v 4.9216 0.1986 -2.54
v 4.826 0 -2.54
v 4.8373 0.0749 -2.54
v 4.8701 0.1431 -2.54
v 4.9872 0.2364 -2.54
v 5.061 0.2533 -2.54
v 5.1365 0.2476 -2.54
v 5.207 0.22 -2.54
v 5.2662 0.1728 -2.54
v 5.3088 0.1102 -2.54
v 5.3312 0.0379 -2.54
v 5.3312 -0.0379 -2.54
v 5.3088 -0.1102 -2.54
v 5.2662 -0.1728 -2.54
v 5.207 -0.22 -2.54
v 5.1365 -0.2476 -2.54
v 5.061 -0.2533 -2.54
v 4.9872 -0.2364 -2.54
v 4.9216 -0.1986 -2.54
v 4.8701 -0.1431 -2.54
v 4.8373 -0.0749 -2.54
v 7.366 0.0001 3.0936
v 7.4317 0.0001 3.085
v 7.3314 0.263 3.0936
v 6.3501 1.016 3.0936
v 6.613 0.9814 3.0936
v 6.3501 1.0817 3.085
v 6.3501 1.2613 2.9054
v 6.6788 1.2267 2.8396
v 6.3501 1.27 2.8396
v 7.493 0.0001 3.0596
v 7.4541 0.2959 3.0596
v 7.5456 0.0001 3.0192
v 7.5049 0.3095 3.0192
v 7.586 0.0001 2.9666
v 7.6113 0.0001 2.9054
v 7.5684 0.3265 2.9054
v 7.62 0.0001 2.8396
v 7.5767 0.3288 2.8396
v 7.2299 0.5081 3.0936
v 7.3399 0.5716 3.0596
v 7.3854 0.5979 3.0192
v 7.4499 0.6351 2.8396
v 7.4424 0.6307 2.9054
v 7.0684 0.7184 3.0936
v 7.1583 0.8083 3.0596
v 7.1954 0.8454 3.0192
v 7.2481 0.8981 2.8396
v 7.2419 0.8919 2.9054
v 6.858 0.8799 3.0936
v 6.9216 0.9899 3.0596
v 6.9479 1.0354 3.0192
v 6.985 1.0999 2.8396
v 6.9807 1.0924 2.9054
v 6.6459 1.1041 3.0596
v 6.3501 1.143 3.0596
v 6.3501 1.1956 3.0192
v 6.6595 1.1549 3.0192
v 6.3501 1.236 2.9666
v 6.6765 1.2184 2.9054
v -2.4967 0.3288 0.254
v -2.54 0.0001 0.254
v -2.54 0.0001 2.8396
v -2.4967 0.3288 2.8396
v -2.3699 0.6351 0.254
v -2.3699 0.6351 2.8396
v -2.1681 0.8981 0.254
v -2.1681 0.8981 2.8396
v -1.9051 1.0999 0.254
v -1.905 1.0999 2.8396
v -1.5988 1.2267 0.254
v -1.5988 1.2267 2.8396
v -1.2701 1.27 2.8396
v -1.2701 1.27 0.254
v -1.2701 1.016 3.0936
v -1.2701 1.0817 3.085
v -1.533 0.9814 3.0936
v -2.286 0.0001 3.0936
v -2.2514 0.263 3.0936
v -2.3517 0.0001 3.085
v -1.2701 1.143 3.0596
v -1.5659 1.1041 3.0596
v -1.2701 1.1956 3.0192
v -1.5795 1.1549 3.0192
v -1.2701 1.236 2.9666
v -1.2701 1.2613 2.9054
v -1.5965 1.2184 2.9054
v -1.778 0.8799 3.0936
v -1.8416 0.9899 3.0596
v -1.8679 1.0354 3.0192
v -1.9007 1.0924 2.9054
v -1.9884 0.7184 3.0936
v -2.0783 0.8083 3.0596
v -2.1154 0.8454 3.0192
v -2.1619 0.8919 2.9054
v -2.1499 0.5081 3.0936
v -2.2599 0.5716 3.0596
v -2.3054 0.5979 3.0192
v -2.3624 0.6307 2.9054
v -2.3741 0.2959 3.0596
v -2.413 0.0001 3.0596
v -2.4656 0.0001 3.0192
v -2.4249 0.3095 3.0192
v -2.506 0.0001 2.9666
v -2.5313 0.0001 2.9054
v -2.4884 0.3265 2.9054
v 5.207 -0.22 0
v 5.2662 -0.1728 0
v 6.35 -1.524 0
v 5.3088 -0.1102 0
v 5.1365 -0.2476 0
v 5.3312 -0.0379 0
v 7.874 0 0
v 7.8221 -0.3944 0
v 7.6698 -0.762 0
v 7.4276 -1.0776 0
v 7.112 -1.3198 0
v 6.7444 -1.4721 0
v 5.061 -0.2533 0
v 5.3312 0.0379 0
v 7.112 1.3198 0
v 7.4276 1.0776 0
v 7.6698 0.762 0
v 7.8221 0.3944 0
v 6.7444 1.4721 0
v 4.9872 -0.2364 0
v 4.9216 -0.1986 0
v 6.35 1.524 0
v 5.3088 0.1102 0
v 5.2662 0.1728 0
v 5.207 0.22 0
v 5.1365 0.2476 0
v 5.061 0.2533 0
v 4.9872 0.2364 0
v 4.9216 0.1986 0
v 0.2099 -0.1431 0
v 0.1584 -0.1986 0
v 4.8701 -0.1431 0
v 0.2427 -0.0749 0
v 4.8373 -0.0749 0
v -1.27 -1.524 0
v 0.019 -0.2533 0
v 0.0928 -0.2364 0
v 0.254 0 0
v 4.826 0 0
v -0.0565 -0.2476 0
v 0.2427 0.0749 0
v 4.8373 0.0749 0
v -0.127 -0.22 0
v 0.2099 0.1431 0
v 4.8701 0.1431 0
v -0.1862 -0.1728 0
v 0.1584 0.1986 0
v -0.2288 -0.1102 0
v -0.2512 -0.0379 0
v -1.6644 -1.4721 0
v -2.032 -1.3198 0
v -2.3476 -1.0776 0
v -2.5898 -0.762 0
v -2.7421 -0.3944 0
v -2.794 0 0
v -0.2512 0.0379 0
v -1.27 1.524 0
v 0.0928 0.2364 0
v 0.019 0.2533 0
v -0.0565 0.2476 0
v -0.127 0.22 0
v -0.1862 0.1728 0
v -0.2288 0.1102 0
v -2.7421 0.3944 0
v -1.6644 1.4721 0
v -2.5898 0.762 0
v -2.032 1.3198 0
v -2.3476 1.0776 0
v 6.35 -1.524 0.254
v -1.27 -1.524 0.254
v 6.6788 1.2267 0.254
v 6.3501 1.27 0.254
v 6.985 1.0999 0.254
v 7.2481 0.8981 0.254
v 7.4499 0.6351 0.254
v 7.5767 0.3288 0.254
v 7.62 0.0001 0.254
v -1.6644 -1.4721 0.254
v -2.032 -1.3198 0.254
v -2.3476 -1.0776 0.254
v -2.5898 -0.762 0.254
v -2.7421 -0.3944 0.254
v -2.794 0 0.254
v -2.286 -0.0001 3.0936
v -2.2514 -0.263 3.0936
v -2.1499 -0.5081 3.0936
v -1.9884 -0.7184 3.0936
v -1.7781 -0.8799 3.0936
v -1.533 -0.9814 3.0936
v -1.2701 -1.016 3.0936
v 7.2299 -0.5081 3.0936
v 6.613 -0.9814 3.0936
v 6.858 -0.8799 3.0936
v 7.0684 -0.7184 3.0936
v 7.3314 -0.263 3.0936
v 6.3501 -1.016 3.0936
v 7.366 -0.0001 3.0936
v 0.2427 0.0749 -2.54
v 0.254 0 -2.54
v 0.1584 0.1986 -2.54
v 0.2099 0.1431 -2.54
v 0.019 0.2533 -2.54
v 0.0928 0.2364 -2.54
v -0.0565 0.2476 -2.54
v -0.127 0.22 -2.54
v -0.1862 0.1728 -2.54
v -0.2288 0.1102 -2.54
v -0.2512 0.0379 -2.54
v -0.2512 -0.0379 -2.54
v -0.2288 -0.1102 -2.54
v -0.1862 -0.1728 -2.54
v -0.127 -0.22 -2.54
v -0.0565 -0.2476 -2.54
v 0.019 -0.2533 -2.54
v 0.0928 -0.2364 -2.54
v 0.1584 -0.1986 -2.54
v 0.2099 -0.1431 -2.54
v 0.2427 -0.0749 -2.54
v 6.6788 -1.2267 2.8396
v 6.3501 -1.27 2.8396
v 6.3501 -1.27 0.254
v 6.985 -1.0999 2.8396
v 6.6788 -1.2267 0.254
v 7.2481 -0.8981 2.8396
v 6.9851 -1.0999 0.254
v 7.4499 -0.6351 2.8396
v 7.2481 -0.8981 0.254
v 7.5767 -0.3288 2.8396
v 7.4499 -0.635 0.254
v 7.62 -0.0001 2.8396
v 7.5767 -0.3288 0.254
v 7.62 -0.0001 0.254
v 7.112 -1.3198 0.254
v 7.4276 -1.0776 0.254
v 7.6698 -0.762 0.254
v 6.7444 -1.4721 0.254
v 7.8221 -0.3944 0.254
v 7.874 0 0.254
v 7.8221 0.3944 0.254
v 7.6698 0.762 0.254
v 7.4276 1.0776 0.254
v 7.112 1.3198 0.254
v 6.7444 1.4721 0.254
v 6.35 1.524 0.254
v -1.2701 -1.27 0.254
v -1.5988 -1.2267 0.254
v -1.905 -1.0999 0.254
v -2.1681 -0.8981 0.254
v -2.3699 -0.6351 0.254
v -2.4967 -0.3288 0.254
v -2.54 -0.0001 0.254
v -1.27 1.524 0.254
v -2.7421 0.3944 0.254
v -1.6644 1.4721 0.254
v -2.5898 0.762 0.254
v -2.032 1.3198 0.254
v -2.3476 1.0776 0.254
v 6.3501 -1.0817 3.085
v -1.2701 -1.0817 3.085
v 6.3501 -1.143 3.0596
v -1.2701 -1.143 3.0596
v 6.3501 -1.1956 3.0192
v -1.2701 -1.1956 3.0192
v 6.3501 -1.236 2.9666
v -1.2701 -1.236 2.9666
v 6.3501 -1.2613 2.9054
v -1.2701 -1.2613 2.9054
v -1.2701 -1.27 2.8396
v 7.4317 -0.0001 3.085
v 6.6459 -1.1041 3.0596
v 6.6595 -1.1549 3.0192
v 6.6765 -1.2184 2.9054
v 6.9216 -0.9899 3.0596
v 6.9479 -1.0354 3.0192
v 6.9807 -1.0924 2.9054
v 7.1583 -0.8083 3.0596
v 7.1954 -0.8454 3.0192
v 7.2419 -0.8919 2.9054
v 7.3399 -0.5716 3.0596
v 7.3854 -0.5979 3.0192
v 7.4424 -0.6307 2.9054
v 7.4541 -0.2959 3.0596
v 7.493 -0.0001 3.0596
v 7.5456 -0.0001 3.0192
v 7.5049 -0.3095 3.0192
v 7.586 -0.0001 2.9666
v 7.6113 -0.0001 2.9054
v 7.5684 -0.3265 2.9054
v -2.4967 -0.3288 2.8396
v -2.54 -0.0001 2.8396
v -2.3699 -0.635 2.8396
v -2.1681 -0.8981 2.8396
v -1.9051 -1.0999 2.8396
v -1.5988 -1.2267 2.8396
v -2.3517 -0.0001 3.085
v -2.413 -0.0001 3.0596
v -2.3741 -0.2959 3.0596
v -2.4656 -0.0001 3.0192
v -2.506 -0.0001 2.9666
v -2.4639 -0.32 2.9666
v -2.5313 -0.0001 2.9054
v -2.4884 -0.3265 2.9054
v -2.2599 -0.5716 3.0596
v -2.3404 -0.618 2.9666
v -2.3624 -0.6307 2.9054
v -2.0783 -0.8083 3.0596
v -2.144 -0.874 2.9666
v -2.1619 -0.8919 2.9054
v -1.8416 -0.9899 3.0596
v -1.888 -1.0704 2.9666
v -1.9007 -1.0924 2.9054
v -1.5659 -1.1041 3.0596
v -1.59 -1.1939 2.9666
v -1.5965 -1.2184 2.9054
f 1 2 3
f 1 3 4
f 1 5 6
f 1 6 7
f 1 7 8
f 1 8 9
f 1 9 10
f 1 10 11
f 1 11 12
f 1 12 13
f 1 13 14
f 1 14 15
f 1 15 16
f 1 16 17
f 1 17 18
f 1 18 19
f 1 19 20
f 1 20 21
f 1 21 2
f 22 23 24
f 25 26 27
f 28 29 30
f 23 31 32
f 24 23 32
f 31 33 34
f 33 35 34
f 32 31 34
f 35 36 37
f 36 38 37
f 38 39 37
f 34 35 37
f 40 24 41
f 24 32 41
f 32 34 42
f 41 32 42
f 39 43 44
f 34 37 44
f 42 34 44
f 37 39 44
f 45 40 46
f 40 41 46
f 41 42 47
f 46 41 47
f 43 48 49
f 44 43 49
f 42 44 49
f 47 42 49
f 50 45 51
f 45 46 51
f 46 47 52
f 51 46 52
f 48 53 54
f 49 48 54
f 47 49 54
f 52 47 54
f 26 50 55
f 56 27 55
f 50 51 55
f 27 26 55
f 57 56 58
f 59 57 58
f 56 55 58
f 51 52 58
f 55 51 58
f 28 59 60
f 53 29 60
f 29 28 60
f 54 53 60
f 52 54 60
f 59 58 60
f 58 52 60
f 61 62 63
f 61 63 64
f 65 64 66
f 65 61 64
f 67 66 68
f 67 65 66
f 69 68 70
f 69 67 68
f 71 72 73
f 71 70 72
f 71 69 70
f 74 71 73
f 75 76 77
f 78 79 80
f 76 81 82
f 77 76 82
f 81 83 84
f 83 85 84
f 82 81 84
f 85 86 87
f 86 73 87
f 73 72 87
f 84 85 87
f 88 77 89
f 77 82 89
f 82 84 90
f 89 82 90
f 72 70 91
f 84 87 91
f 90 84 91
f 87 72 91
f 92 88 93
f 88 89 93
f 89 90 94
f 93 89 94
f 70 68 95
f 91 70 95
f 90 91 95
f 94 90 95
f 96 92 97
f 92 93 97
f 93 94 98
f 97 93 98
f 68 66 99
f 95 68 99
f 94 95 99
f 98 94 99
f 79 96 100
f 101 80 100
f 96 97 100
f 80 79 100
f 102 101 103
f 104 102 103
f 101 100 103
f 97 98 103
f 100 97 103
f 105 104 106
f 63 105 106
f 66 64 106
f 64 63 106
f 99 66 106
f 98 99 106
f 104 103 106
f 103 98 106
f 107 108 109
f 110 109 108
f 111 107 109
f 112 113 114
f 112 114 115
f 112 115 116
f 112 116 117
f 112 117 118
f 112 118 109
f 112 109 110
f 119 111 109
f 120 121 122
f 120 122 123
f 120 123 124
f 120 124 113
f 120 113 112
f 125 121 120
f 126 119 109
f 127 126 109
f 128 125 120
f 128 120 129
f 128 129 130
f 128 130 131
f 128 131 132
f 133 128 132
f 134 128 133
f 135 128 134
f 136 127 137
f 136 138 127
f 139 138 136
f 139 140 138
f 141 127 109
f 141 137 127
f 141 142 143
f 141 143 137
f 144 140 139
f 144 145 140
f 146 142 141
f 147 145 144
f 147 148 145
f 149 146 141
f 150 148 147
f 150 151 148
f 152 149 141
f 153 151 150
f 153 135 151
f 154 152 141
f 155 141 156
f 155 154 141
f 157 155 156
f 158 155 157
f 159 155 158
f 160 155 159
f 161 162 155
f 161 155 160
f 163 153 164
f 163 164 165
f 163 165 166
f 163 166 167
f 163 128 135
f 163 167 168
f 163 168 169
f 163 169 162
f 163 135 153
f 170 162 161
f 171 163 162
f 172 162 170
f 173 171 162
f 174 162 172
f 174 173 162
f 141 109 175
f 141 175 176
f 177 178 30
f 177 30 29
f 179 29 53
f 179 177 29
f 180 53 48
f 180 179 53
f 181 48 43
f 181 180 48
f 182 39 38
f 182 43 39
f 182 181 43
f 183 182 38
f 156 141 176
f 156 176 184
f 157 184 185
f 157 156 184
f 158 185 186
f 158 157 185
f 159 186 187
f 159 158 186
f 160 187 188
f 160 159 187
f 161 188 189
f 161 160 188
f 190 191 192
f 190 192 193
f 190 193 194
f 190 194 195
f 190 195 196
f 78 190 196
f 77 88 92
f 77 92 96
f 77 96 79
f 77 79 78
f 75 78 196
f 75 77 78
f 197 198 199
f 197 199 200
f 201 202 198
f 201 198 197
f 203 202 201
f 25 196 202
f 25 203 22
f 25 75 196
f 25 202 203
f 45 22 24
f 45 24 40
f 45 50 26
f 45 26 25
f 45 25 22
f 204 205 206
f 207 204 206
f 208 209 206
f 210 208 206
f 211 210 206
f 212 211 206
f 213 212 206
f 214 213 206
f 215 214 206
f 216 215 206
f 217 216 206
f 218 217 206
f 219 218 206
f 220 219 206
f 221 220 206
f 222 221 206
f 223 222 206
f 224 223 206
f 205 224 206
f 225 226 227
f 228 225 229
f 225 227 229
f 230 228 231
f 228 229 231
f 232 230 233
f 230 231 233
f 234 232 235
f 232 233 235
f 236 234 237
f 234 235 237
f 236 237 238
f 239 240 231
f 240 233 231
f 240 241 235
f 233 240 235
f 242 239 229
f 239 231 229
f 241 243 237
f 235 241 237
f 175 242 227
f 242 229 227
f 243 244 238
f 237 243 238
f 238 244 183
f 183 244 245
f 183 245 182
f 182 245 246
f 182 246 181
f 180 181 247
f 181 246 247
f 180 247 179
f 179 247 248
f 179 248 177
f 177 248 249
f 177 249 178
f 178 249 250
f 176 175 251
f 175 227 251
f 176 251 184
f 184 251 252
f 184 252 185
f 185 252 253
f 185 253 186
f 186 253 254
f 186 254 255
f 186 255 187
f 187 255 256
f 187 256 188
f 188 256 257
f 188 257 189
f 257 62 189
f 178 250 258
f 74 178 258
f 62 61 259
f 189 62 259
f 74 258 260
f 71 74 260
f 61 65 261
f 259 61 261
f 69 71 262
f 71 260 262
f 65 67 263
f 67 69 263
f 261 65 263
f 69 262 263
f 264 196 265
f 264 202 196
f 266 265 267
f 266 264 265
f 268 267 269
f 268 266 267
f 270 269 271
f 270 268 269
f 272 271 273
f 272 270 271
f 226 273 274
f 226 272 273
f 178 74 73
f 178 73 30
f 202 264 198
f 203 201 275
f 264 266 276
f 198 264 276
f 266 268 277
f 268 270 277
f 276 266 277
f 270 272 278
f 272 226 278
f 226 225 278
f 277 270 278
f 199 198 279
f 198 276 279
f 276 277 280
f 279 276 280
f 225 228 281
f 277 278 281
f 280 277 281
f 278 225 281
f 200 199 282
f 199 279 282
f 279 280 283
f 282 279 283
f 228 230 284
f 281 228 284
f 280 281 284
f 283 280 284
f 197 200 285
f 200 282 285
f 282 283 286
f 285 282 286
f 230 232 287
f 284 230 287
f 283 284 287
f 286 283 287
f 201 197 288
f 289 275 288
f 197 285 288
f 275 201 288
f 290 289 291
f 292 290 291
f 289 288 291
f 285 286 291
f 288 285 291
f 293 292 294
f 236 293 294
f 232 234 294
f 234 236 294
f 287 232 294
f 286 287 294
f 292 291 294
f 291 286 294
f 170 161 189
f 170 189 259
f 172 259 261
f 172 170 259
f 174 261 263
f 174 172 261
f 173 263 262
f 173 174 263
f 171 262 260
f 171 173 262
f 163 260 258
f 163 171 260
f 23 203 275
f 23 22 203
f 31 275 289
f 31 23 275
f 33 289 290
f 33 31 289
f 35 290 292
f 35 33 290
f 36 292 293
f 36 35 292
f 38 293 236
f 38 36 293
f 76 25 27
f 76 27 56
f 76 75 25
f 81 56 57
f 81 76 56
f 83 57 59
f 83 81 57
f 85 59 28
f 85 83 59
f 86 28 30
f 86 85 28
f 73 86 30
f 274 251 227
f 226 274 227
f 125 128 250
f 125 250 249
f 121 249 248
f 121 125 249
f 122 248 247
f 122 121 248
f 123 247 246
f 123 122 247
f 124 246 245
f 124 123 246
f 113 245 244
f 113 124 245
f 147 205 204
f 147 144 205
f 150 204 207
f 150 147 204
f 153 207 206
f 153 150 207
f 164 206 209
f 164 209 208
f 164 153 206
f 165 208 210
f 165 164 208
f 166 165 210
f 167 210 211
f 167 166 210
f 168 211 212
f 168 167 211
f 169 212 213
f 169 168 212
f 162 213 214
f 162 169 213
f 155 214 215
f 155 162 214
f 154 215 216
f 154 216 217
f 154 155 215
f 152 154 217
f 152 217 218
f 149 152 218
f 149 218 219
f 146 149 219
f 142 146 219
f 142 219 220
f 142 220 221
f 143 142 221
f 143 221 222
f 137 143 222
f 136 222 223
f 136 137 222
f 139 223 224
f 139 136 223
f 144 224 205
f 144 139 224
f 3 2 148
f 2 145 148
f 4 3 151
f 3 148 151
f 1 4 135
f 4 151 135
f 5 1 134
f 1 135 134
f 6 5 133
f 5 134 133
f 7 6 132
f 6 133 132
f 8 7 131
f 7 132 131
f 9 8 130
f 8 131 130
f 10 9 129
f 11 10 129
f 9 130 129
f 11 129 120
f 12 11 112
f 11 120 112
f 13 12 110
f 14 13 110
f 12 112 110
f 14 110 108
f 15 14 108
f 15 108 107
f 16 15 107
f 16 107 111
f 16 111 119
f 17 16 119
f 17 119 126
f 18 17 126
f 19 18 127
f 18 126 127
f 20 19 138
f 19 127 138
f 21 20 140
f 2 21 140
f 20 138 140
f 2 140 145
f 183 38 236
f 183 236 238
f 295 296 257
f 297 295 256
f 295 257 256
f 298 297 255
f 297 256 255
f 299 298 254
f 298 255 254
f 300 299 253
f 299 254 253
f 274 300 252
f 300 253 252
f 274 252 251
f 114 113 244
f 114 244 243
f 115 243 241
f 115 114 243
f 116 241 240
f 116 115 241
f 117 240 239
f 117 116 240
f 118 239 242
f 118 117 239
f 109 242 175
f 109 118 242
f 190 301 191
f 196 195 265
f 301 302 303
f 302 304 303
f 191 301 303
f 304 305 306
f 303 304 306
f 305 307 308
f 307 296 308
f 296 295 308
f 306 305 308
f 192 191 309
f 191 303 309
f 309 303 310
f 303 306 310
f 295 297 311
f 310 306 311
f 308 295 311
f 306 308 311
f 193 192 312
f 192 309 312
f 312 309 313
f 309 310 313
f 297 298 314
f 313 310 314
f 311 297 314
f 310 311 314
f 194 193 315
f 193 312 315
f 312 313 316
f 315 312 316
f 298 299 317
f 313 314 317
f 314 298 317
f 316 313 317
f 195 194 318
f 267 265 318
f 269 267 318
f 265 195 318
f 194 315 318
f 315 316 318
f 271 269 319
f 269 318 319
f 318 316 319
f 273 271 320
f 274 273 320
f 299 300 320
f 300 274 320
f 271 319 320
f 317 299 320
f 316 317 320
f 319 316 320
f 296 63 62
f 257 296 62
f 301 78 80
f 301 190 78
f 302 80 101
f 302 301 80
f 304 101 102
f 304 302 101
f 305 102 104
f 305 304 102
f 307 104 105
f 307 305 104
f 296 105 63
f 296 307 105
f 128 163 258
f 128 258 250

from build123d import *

# Parameters (mm, degrees)
SKETCH2_R           = 0.254
SKETCH4_W           = 10.16
SKETCH4_H           = 3.093614779
BOSS_EXTRUDE1_DEPTH = 1.27
FILLET1_R           = 1.27
FILLET2_R           = 0.254
BOSS_EXTRUDE2_DEPTH = 0.254


with BuildPart() as part:
    # Base-Sweep: sweep along a path in Sketch1
    with BuildLine(Plane(origin=(0, 0, 0), x_dir=(1, 0, 0), z_dir=(0, 1, 0))) as base_sweep_path:
        Line((0, 2.54), (0, -0.508))
    # Sketch2 → Base-Sweep (sweep)
    with BuildSketch(Plane.XY.offset(-2.54)):
        Circle(SKETCH2_R)
    base_sweep = sweep(path=base_sweep_path.line)

    # Sketch4 → Boss-Extrude1 (add, symmetric)
    with BuildSketch(Plane(origin=(0, 0, 0), x_dir=(1, 0, 0), z_dir=(0, 1, 0))):
        with Locations((2.54, -1.54680739)):
            Rectangle(SKETCH4_W, SKETCH4_H)
    extrude(amount=BOSS_EXTRUDE1_DEPTH, both=True)

    # Fillet1
    fillet1_edges = [part.edges().sort_by_distance(p)[0] for p in [
        (-2.54, -1.27, 1.546807389),
        (7.62, -1.27, 1.546807389),
        (-2.54, 1.27, 1.546807389),
        (7.62, 1.27, 1.546807389),
    ]]
    fillet(fillet1_edges, radius=FILLET1_R - 0.0001)  # a hair under: the kernel refuses the full size

    # Fillet2
    fillet2_edges = [part.edges().sort_by_distance(p)[0] for p in [
        (2.54, -1.27, 3.093614779),
        (2.54, 1.27, 3.093614779),
        (7.248054901, 0.898054901, 3.093614779),
        (7.248054901, -0.898054901, 3.093614779),
        (-2.168054901, 0.898054901, 3.093614779),
        (-2.168054901, -0.898054901, 3.093614779),
    ]]
    fillet(fillet2_edges, radius=FILLET2_R)

    # Mirror5: Base-Sweep across plane
    add(base_sweep.mirror(Plane(origin=(2.54, 0, 0), x_dir=(0, 0, 1), z_dir=(1, 0, 0))))

    # Sketch6 → Boss-Extrude2 (add)
    with BuildSketch(Plane(origin=(0, 0, 0), x_dir=(-1, 0, 0), z_dir=(0, 0, -1))):
        with BuildLine():
            Line((-6.35, -1.524), (1.27, -1.524))
            ThreePointArc((1.27, -1.524), (2.347630735, -1.077630735), (2.794, 0))
            ThreePointArc((2.794, 0), (2.347630735, 1.077630735), (1.27, 1.524))
            Line((1.27, 1.524), (-6.35, 1.524))
            ThreePointArc((-6.35, 1.524), (-7.427630735, 1.077630735), (-7.874, 0))
            ThreePointArc((-7.874, 0), (-7.427630735, -1.077630735), (-6.35, -1.524))
        make_face()
    extrude(amount=-BOSS_EXTRUDE2_DEPTH)


solid = part.part
